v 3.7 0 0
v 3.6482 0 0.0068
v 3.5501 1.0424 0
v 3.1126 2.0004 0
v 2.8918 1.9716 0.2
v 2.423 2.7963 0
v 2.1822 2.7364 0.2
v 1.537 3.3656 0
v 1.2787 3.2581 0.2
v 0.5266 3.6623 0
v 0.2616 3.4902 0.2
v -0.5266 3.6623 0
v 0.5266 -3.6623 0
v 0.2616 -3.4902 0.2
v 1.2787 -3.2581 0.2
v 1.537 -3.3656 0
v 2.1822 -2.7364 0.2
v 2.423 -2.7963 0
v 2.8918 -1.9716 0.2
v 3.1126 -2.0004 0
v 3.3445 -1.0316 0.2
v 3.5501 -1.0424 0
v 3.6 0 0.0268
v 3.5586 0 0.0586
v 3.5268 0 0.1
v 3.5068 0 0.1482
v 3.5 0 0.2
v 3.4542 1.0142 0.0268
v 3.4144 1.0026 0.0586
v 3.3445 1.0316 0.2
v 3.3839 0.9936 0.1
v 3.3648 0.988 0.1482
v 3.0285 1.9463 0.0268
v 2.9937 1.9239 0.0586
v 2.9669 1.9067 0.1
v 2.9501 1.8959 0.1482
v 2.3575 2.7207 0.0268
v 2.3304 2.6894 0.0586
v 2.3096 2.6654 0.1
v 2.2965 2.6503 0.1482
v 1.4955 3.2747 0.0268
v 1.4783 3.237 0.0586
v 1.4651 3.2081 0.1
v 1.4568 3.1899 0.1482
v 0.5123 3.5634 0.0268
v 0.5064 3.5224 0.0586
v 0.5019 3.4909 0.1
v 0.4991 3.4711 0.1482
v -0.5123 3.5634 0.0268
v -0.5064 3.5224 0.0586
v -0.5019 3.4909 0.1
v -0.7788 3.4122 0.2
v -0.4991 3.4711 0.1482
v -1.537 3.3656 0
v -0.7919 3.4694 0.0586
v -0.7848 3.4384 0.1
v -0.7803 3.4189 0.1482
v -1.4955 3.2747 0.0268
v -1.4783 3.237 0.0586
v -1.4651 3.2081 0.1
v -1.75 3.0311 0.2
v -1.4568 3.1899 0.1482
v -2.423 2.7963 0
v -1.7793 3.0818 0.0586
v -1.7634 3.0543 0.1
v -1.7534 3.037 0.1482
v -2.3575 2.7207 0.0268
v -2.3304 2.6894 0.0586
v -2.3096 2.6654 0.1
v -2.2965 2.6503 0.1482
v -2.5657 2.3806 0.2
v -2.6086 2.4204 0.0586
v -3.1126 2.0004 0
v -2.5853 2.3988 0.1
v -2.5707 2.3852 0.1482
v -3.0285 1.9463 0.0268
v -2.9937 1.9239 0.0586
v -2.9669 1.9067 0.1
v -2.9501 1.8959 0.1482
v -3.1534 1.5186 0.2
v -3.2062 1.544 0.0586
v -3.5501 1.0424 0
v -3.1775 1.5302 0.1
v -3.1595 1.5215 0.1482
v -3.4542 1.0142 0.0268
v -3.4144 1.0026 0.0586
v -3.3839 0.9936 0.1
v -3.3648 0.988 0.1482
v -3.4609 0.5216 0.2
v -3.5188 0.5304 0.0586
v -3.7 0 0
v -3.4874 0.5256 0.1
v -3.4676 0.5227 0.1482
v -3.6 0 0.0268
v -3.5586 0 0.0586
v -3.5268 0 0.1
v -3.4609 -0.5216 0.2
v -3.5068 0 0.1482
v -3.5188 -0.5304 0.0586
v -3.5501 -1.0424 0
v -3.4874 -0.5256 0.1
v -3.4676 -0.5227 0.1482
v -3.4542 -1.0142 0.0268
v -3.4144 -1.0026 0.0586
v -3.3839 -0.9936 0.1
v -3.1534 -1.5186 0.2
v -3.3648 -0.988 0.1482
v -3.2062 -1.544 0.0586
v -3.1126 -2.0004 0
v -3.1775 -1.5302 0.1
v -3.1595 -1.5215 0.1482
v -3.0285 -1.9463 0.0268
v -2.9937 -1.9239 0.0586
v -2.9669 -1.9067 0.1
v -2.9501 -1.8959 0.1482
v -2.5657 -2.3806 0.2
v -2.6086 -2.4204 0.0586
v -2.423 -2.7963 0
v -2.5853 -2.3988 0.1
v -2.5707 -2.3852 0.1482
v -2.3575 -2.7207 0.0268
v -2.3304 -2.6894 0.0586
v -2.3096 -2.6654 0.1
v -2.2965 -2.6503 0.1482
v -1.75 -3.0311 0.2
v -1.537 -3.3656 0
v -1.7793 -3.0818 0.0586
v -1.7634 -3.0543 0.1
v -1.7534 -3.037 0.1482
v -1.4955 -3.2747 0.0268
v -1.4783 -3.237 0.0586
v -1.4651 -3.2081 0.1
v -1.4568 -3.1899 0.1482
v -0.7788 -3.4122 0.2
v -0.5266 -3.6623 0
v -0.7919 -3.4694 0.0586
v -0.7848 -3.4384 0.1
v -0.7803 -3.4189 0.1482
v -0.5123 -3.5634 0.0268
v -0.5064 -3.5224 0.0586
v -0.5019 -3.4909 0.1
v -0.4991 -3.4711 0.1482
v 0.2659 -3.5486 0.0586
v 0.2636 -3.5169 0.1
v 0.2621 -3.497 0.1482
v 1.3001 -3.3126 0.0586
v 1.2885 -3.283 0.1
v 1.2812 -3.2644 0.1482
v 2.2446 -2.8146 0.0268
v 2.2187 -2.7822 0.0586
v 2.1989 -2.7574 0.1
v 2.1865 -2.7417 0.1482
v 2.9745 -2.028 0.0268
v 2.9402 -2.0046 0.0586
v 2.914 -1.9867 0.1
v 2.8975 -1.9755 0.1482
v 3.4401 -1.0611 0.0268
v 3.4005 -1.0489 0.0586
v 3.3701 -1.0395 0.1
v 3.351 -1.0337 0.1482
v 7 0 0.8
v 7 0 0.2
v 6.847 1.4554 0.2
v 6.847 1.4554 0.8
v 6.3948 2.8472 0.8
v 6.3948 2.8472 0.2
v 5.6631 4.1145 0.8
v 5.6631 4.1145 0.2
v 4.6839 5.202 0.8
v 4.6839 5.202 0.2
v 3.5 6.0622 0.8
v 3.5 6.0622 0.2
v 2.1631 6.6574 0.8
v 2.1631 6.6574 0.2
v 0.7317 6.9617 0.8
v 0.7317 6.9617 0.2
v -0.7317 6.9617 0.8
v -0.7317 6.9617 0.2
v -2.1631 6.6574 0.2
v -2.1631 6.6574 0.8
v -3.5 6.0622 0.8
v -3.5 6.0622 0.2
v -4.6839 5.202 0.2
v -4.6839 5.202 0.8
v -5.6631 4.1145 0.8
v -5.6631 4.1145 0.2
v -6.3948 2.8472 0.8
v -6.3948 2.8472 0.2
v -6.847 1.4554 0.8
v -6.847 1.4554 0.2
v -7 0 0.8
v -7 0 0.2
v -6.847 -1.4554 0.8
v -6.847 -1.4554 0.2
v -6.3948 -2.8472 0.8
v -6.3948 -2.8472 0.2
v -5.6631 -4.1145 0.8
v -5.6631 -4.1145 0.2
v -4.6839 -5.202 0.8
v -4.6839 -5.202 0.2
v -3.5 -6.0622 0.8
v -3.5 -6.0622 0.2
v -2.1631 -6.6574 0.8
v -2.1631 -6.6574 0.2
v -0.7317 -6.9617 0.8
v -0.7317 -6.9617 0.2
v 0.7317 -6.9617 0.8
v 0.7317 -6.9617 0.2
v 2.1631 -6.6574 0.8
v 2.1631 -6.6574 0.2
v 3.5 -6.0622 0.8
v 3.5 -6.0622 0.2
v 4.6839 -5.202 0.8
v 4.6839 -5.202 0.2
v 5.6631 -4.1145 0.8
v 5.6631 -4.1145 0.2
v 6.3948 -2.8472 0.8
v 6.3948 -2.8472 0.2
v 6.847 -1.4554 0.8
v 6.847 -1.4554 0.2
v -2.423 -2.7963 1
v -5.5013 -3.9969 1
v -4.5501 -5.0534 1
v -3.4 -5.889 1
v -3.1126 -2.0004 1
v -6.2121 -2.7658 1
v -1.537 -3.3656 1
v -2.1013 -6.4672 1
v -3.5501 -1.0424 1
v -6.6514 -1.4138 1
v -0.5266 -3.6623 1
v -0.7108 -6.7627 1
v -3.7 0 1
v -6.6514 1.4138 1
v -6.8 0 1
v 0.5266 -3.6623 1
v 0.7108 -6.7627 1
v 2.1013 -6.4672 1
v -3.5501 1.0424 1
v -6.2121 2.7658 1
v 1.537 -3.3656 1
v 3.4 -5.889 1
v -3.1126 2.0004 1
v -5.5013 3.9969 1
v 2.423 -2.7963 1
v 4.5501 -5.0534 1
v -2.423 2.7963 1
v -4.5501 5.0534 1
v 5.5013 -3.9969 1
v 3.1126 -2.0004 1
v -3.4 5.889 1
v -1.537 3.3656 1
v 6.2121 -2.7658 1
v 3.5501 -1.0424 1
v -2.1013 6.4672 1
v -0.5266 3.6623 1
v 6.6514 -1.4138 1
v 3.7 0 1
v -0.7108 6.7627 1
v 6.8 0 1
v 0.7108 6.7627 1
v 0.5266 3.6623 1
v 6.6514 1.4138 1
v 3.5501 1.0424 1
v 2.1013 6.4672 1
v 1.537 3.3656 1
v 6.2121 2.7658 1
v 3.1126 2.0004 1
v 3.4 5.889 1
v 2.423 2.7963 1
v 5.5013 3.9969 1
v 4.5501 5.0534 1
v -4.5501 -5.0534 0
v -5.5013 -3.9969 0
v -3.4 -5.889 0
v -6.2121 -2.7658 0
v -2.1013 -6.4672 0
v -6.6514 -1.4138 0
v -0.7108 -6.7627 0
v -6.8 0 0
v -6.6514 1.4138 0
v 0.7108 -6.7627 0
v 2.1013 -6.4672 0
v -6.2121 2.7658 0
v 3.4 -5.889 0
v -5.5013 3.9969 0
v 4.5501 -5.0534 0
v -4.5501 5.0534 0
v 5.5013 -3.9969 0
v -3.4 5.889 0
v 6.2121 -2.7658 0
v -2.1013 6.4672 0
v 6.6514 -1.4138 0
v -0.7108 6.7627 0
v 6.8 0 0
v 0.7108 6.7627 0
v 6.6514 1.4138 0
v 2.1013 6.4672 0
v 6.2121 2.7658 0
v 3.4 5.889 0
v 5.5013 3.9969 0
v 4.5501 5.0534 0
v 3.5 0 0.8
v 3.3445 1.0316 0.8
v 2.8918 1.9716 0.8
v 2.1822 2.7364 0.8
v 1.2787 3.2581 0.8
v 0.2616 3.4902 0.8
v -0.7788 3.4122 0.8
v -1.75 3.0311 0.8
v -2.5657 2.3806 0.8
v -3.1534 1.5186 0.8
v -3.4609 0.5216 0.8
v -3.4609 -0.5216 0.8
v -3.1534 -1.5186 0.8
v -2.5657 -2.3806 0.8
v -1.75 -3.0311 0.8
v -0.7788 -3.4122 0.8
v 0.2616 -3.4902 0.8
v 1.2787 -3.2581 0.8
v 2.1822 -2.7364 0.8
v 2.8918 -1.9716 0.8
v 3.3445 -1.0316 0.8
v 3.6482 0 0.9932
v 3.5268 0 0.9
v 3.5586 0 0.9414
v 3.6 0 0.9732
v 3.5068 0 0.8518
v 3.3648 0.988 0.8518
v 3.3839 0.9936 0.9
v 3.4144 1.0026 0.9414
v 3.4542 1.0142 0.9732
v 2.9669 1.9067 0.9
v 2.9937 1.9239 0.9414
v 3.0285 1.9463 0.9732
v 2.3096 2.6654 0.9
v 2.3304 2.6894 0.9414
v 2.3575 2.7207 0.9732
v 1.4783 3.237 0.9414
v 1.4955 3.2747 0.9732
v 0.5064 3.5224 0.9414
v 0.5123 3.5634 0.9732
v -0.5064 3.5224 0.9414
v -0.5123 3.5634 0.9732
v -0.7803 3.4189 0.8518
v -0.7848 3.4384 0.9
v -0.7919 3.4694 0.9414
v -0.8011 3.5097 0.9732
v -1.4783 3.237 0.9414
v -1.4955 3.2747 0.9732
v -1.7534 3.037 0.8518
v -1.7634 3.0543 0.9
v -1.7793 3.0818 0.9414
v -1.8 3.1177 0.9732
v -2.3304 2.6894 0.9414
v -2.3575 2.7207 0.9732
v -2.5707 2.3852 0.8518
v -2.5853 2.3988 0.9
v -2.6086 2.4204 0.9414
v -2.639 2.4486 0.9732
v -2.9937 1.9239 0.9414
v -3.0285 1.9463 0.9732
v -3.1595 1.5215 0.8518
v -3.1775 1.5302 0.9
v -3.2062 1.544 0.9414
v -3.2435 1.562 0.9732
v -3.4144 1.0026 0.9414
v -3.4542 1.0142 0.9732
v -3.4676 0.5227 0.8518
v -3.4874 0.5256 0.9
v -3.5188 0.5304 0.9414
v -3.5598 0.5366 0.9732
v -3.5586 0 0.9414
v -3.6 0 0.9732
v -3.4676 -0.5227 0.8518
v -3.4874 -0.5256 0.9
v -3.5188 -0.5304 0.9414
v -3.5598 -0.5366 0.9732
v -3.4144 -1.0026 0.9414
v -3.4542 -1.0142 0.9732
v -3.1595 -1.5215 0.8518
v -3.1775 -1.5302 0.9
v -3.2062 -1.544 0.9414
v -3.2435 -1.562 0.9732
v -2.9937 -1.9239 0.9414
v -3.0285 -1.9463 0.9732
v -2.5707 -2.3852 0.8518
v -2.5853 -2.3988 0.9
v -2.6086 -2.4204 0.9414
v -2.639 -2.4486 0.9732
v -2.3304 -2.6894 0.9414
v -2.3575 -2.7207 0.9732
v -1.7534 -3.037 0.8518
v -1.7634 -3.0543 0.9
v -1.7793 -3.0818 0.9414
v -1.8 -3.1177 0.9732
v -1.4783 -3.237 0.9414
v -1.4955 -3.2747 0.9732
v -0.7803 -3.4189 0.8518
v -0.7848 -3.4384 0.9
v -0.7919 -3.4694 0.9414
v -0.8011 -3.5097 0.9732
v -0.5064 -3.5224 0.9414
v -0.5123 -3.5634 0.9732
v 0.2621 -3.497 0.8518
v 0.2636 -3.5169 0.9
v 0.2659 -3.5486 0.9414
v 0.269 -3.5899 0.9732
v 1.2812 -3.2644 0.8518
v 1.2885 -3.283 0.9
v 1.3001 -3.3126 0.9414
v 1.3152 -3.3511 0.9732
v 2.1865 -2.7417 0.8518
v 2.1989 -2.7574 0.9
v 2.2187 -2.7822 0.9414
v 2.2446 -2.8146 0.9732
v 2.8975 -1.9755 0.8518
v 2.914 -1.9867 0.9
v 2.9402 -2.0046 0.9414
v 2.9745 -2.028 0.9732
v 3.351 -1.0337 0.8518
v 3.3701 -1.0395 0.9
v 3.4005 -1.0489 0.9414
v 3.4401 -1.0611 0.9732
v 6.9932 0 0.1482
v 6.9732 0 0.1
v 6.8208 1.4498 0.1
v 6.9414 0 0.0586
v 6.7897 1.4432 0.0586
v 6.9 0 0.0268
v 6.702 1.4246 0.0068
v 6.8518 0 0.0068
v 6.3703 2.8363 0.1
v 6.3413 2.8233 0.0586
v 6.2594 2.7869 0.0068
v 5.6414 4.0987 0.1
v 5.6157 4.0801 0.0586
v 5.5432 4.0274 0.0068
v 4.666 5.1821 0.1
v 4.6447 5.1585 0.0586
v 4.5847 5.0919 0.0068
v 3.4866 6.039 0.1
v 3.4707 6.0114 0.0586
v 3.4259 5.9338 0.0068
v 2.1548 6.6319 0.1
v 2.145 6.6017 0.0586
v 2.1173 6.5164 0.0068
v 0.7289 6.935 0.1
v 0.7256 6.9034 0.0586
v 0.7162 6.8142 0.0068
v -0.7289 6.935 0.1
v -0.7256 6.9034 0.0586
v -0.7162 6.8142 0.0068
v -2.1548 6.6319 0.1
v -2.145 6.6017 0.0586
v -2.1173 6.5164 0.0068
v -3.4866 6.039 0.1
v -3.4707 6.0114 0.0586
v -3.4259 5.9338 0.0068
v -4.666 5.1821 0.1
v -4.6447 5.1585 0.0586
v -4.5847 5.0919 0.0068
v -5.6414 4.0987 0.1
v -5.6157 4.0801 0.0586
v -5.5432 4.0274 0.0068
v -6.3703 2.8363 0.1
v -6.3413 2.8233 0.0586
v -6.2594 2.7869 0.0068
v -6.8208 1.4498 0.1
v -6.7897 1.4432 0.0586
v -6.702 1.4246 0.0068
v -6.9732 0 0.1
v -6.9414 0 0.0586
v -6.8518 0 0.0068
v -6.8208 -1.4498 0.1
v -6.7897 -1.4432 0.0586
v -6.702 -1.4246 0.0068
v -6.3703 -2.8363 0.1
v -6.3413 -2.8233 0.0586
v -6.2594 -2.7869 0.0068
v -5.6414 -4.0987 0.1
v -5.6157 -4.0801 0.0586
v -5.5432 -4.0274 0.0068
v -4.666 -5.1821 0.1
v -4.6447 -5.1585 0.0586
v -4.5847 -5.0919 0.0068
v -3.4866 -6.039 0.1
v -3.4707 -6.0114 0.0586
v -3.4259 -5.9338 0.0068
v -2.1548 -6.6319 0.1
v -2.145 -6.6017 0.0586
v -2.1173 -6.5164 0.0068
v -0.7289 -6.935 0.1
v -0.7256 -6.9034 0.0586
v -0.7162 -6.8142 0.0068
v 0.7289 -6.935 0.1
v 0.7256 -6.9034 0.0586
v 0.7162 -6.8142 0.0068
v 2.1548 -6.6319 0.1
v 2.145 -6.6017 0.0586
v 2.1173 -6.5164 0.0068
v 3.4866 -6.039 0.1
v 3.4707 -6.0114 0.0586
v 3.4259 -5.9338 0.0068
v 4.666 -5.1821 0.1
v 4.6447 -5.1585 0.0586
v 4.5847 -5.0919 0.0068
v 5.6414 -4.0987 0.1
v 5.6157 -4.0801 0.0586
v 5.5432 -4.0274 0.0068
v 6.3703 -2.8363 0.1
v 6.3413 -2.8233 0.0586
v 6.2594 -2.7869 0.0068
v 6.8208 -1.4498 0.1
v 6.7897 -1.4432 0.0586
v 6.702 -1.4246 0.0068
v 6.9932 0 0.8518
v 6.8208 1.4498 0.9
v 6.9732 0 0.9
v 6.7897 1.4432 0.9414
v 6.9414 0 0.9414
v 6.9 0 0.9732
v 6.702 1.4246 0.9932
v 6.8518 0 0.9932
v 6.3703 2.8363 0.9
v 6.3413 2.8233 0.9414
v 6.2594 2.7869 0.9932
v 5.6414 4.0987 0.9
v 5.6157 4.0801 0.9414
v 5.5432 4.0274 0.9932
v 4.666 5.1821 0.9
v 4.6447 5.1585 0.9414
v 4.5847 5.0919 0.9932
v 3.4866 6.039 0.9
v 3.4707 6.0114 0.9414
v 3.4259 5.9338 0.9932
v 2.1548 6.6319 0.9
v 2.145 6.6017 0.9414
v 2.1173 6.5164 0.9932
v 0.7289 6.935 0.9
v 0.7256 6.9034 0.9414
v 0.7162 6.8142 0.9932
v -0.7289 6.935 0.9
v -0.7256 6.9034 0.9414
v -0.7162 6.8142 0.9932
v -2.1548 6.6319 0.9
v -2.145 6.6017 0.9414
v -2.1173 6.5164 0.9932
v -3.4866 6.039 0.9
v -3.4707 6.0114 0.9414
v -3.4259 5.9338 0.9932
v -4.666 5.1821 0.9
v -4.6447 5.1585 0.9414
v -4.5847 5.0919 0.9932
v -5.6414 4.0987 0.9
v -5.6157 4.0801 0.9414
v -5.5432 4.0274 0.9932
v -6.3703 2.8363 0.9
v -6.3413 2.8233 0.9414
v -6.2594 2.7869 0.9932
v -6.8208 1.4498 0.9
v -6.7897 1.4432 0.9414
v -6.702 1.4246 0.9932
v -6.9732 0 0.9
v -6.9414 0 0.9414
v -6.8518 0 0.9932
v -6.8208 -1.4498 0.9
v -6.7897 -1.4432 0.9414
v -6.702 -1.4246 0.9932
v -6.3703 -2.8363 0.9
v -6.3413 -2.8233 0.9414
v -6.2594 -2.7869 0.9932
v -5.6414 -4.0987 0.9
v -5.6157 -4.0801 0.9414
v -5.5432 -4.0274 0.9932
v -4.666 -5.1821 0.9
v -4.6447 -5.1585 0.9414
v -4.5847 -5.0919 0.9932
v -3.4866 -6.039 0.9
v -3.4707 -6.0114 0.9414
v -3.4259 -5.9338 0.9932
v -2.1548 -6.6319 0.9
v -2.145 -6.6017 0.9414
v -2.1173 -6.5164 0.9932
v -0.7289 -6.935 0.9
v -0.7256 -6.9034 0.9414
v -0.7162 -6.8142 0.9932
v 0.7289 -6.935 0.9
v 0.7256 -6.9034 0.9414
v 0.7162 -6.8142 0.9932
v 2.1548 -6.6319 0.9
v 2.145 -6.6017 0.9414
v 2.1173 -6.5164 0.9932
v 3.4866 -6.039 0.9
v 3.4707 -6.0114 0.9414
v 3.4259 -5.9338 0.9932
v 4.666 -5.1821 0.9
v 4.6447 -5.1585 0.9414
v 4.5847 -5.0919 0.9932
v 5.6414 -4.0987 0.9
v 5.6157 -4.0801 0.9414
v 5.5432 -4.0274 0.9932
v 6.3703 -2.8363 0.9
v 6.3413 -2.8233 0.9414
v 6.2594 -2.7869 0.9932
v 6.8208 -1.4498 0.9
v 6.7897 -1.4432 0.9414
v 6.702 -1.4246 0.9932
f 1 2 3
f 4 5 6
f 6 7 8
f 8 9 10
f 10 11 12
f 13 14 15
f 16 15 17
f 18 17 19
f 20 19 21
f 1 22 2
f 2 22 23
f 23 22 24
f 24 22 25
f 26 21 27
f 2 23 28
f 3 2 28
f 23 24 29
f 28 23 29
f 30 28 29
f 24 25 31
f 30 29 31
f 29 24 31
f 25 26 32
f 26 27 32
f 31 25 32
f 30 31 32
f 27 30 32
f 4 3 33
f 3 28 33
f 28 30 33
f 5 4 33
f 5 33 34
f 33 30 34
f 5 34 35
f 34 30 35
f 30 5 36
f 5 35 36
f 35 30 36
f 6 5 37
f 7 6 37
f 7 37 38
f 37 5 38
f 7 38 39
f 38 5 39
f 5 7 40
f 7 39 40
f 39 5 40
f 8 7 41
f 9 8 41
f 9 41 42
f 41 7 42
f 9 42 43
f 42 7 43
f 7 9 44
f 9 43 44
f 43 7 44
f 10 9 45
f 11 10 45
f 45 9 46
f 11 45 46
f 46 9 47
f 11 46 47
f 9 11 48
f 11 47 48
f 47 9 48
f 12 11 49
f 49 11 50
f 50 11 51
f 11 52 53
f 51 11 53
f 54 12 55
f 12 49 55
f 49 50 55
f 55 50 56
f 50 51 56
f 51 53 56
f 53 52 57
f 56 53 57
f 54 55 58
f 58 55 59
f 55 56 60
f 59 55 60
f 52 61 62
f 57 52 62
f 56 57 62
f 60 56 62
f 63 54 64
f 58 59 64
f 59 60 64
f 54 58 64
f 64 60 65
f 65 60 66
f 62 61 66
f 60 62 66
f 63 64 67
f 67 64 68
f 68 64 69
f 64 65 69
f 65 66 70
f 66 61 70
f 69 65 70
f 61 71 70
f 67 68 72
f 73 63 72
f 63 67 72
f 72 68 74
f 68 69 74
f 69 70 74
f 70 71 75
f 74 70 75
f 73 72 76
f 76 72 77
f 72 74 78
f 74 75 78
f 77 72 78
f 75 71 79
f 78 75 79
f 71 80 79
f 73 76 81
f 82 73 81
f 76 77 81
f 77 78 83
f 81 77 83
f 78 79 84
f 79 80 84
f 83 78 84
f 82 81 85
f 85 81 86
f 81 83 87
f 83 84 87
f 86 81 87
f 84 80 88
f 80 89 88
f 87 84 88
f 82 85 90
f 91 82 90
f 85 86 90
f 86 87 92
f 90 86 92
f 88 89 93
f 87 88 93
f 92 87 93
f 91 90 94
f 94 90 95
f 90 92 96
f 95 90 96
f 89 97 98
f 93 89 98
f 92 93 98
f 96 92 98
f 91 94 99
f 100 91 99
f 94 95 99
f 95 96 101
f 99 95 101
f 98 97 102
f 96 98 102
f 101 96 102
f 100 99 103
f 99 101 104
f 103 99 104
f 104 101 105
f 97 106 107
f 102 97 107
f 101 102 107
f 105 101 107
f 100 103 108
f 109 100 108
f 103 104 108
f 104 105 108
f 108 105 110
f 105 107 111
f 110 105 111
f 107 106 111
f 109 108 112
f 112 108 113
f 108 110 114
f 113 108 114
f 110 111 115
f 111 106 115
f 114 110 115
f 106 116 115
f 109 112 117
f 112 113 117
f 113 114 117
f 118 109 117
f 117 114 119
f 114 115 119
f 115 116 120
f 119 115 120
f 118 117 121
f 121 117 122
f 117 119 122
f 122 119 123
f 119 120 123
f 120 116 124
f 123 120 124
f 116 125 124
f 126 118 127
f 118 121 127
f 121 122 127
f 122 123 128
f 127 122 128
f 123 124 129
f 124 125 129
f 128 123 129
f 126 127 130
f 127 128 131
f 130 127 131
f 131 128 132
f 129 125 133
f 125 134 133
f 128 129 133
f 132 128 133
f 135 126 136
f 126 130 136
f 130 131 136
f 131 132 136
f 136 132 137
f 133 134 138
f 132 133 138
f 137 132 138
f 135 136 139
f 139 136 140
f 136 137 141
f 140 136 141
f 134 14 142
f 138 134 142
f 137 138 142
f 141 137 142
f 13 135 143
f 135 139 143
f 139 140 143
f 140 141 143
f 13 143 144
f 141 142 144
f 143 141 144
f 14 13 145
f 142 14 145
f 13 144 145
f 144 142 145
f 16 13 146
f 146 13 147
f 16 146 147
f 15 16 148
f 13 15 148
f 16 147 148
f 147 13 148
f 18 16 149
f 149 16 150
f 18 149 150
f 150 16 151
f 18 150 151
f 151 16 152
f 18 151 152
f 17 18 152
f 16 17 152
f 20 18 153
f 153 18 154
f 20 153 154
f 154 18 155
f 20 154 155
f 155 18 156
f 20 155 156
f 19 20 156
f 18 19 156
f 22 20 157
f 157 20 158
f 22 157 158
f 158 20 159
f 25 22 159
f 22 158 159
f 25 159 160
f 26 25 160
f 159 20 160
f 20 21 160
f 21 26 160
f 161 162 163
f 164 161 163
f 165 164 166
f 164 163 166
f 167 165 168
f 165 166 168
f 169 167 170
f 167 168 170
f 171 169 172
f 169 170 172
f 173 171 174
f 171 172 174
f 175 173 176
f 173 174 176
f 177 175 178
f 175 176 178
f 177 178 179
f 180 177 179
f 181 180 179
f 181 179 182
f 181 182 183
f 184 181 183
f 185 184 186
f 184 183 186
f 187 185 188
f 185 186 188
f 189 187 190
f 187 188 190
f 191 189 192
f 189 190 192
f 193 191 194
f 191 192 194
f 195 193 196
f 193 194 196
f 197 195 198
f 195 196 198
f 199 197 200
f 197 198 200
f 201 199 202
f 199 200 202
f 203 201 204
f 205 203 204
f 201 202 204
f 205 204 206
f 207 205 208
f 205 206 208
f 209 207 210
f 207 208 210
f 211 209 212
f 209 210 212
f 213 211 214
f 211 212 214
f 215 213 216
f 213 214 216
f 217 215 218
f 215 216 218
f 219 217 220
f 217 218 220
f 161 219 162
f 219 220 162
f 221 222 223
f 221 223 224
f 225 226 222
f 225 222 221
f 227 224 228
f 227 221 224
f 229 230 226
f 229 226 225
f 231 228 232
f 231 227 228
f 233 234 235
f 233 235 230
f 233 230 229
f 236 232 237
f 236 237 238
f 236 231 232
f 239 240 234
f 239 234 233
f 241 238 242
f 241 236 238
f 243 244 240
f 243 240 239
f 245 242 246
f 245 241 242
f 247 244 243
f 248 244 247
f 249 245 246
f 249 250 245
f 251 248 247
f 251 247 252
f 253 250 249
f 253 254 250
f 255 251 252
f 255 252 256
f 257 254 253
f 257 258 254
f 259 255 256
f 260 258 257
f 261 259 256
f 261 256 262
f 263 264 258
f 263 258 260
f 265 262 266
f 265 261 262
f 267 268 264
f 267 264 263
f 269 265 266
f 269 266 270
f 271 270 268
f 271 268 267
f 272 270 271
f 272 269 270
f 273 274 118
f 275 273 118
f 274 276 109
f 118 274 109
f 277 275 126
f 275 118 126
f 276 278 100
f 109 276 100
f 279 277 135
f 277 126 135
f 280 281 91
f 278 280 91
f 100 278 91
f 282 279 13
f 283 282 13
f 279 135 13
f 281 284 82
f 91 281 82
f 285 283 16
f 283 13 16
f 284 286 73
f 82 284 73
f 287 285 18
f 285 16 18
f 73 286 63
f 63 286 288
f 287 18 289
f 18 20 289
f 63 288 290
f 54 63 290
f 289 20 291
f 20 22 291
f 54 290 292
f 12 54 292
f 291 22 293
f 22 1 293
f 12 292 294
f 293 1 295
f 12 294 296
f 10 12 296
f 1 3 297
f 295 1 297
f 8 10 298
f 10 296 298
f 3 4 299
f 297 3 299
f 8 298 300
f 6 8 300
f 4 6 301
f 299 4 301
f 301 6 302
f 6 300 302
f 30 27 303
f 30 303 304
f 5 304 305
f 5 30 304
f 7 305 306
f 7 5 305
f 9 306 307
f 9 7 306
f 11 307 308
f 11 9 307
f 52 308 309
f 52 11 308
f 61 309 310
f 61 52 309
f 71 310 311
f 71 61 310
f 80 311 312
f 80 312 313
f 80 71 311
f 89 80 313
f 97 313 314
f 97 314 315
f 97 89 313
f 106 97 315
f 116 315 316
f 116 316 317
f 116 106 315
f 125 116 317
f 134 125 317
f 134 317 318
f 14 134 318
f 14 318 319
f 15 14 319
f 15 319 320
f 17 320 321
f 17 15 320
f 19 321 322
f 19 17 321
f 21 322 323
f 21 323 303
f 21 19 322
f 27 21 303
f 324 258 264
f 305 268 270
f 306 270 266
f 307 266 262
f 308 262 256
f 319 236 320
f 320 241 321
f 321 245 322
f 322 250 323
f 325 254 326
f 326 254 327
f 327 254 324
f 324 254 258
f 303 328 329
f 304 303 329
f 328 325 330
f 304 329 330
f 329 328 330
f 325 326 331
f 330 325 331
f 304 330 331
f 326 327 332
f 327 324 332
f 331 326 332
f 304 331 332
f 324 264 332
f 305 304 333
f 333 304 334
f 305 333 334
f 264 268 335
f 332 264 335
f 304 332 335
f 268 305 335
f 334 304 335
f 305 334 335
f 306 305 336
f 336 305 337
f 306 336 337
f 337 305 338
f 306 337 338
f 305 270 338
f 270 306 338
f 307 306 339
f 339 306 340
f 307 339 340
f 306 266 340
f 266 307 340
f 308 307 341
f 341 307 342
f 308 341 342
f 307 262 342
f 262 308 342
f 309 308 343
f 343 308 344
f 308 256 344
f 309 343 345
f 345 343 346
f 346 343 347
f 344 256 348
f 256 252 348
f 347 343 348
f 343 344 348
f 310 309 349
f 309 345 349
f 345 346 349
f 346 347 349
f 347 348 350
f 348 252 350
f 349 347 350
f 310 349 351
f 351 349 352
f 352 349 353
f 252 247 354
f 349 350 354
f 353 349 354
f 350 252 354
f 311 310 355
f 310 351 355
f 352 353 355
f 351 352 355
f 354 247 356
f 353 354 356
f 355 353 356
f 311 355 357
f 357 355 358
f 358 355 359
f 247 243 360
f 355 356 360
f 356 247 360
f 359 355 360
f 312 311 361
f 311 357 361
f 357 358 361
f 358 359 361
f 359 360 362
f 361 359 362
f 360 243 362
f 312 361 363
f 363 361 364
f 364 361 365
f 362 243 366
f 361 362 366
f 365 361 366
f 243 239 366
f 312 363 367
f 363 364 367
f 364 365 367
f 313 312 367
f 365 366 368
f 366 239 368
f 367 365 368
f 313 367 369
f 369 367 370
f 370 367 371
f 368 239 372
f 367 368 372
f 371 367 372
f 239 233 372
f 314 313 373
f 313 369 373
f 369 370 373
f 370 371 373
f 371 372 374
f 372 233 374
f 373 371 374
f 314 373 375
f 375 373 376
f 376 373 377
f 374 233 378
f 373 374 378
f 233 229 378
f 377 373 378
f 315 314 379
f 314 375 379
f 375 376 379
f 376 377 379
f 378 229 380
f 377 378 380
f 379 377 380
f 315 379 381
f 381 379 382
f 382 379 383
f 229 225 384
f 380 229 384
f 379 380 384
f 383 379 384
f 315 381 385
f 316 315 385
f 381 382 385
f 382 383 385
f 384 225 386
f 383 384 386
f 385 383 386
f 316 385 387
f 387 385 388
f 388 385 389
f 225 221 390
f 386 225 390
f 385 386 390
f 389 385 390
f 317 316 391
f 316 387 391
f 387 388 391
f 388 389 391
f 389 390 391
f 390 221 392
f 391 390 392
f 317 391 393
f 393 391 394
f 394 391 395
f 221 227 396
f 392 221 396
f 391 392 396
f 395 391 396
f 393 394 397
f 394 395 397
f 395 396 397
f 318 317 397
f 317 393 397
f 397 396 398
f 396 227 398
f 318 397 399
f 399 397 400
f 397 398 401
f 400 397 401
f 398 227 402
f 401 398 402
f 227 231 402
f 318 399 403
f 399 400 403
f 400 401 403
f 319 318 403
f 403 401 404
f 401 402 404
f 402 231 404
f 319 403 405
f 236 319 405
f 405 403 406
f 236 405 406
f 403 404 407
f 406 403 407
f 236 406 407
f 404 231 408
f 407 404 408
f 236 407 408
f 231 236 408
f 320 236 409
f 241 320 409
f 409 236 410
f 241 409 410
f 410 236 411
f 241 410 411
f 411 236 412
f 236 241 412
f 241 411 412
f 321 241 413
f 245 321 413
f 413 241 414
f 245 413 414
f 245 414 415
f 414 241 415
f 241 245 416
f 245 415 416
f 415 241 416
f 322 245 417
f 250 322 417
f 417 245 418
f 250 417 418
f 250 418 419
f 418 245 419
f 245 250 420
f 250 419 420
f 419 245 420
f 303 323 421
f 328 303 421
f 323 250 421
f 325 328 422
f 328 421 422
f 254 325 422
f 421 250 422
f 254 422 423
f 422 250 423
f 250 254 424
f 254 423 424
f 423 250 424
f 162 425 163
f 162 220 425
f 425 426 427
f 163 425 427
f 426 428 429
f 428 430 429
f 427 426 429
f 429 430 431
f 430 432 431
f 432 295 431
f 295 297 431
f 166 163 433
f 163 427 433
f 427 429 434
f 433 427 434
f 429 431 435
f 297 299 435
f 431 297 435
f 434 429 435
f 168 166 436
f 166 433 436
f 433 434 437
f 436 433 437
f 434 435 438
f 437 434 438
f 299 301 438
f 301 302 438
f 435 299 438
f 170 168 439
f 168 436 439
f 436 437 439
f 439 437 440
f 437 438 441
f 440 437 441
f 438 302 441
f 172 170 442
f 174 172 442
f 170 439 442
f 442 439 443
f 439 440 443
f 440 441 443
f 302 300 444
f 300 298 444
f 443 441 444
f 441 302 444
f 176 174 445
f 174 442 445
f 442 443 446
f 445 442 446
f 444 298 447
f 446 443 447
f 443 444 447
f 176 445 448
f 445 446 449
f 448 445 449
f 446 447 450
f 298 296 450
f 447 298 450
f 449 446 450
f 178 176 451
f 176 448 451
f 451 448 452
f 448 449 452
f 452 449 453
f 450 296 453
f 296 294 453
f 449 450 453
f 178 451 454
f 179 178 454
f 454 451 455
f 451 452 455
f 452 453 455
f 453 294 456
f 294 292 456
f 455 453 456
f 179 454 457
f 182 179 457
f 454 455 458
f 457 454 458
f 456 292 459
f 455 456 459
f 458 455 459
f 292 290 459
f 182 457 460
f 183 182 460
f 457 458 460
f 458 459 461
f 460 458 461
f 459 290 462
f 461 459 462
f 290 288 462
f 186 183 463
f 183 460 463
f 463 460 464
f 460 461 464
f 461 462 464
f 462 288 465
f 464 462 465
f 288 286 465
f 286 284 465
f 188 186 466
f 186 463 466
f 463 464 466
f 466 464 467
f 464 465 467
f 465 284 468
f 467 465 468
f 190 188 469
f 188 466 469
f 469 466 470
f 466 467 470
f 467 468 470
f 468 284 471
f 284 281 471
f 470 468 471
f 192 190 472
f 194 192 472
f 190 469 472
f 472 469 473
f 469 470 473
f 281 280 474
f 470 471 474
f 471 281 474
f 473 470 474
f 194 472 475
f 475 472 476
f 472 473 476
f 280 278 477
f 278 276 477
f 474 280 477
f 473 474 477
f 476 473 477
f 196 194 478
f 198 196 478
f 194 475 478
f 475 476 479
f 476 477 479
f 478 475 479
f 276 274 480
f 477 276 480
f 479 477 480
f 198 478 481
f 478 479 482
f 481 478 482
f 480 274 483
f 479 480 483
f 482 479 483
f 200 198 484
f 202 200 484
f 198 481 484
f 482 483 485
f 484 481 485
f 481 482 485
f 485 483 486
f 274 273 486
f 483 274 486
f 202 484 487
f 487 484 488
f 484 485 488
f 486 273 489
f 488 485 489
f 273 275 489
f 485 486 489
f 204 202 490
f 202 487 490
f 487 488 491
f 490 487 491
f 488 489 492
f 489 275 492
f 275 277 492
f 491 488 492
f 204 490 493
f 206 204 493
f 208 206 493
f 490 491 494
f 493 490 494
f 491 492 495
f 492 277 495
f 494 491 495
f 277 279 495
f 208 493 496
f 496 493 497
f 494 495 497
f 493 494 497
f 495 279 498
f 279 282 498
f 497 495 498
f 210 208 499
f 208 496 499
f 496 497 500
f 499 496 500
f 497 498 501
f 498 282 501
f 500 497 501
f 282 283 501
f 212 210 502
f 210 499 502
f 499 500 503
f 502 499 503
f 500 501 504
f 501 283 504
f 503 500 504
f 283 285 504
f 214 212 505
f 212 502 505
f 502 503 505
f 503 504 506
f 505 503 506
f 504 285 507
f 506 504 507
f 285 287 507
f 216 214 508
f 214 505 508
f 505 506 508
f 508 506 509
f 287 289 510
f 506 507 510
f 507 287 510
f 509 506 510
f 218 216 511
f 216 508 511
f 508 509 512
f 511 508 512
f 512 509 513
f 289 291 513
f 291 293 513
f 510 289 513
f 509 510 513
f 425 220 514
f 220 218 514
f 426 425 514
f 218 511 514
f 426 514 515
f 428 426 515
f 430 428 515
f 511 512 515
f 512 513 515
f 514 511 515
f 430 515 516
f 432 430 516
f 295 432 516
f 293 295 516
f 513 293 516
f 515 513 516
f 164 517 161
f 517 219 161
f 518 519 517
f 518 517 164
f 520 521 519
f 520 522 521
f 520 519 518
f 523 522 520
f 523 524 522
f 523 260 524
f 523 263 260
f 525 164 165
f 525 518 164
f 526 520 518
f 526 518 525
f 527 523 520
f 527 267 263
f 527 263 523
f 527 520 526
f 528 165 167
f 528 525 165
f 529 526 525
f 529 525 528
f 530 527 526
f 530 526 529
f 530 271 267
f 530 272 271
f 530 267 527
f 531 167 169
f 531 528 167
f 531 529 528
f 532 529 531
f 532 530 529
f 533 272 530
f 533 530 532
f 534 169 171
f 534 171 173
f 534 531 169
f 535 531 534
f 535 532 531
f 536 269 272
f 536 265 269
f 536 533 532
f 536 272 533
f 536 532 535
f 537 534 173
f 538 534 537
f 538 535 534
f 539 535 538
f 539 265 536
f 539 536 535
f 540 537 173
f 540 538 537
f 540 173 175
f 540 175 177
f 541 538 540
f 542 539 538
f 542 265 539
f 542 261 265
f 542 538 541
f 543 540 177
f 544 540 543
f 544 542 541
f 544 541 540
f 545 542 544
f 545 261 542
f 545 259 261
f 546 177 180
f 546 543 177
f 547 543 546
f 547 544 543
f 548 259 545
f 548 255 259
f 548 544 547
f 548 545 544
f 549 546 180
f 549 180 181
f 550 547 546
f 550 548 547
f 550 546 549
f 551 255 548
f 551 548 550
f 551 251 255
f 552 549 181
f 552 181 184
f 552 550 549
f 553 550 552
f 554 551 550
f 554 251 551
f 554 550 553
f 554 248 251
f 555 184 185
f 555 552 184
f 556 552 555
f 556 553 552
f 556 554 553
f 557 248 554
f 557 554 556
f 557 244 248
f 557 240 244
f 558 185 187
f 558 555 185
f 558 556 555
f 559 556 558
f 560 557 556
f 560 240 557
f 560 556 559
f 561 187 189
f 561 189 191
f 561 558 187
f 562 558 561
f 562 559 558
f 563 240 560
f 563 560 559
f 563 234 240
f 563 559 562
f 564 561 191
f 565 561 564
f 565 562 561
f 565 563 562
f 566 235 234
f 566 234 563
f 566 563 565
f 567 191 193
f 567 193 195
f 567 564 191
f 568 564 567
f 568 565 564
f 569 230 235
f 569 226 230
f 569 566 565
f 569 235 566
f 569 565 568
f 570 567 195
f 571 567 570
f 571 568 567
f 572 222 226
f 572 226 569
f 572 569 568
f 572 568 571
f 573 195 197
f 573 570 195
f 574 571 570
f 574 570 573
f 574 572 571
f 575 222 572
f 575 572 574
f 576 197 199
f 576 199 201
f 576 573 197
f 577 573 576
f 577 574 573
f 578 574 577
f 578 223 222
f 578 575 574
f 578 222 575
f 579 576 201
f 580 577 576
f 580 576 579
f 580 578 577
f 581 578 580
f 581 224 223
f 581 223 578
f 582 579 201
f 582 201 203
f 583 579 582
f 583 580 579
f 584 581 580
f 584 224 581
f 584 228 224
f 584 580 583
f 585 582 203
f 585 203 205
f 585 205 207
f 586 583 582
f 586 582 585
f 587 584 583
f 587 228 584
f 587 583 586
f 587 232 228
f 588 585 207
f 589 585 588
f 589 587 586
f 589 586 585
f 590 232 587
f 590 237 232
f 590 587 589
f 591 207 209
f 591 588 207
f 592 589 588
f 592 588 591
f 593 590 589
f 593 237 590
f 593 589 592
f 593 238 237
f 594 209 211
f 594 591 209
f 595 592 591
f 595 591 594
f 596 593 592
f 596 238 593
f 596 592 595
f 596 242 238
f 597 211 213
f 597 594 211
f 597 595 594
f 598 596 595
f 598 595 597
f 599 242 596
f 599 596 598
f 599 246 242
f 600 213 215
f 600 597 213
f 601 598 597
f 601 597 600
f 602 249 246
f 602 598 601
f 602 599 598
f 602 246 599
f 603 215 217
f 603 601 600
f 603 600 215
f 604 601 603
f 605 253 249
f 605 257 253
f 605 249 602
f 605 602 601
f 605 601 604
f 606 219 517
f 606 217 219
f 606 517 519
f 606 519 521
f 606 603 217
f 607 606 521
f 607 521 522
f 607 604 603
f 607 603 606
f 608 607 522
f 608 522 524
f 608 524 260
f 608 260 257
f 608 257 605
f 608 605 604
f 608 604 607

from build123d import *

# Parameters (mm, degrees)
ESQUISSE1_R        = 7
ESQUISSE1_R_2      = 3.5
BOSS_EXTRU_1_DEPTH = 1
CONG_1_R           = 0.2
CONG_2_R           = 0.2


with BuildPart() as part:
    # Esquisse1 → Boss.-Extru.1 (new body)
    with BuildSketch(Plane.XY):
        Circle(ESQUISSE1_R)
        Circle(ESQUISSE1_R_2, mode=Mode.SUBTRACT)
    extrude(amount=BOSS_EXTRU_1_DEPTH)

    # Congé1
    cong_1_edges = [part.edges().sort_by_distance(p)[0] for p in [
        (-7, 0, 0),
        (-7, 0, 1),
        (-3.5, 0, 1),
    ]]
    fillet(cong_1_edges, radius=CONG_1_R)

    # Congé2
    cong_2_edges = [part.edges().sort_by_distance(p)[0] for p in [
        (-3.5, 0, 0),
    ]]
    fillet(cong_2_edges, radius=CONG_2_R)


solid = part.part
